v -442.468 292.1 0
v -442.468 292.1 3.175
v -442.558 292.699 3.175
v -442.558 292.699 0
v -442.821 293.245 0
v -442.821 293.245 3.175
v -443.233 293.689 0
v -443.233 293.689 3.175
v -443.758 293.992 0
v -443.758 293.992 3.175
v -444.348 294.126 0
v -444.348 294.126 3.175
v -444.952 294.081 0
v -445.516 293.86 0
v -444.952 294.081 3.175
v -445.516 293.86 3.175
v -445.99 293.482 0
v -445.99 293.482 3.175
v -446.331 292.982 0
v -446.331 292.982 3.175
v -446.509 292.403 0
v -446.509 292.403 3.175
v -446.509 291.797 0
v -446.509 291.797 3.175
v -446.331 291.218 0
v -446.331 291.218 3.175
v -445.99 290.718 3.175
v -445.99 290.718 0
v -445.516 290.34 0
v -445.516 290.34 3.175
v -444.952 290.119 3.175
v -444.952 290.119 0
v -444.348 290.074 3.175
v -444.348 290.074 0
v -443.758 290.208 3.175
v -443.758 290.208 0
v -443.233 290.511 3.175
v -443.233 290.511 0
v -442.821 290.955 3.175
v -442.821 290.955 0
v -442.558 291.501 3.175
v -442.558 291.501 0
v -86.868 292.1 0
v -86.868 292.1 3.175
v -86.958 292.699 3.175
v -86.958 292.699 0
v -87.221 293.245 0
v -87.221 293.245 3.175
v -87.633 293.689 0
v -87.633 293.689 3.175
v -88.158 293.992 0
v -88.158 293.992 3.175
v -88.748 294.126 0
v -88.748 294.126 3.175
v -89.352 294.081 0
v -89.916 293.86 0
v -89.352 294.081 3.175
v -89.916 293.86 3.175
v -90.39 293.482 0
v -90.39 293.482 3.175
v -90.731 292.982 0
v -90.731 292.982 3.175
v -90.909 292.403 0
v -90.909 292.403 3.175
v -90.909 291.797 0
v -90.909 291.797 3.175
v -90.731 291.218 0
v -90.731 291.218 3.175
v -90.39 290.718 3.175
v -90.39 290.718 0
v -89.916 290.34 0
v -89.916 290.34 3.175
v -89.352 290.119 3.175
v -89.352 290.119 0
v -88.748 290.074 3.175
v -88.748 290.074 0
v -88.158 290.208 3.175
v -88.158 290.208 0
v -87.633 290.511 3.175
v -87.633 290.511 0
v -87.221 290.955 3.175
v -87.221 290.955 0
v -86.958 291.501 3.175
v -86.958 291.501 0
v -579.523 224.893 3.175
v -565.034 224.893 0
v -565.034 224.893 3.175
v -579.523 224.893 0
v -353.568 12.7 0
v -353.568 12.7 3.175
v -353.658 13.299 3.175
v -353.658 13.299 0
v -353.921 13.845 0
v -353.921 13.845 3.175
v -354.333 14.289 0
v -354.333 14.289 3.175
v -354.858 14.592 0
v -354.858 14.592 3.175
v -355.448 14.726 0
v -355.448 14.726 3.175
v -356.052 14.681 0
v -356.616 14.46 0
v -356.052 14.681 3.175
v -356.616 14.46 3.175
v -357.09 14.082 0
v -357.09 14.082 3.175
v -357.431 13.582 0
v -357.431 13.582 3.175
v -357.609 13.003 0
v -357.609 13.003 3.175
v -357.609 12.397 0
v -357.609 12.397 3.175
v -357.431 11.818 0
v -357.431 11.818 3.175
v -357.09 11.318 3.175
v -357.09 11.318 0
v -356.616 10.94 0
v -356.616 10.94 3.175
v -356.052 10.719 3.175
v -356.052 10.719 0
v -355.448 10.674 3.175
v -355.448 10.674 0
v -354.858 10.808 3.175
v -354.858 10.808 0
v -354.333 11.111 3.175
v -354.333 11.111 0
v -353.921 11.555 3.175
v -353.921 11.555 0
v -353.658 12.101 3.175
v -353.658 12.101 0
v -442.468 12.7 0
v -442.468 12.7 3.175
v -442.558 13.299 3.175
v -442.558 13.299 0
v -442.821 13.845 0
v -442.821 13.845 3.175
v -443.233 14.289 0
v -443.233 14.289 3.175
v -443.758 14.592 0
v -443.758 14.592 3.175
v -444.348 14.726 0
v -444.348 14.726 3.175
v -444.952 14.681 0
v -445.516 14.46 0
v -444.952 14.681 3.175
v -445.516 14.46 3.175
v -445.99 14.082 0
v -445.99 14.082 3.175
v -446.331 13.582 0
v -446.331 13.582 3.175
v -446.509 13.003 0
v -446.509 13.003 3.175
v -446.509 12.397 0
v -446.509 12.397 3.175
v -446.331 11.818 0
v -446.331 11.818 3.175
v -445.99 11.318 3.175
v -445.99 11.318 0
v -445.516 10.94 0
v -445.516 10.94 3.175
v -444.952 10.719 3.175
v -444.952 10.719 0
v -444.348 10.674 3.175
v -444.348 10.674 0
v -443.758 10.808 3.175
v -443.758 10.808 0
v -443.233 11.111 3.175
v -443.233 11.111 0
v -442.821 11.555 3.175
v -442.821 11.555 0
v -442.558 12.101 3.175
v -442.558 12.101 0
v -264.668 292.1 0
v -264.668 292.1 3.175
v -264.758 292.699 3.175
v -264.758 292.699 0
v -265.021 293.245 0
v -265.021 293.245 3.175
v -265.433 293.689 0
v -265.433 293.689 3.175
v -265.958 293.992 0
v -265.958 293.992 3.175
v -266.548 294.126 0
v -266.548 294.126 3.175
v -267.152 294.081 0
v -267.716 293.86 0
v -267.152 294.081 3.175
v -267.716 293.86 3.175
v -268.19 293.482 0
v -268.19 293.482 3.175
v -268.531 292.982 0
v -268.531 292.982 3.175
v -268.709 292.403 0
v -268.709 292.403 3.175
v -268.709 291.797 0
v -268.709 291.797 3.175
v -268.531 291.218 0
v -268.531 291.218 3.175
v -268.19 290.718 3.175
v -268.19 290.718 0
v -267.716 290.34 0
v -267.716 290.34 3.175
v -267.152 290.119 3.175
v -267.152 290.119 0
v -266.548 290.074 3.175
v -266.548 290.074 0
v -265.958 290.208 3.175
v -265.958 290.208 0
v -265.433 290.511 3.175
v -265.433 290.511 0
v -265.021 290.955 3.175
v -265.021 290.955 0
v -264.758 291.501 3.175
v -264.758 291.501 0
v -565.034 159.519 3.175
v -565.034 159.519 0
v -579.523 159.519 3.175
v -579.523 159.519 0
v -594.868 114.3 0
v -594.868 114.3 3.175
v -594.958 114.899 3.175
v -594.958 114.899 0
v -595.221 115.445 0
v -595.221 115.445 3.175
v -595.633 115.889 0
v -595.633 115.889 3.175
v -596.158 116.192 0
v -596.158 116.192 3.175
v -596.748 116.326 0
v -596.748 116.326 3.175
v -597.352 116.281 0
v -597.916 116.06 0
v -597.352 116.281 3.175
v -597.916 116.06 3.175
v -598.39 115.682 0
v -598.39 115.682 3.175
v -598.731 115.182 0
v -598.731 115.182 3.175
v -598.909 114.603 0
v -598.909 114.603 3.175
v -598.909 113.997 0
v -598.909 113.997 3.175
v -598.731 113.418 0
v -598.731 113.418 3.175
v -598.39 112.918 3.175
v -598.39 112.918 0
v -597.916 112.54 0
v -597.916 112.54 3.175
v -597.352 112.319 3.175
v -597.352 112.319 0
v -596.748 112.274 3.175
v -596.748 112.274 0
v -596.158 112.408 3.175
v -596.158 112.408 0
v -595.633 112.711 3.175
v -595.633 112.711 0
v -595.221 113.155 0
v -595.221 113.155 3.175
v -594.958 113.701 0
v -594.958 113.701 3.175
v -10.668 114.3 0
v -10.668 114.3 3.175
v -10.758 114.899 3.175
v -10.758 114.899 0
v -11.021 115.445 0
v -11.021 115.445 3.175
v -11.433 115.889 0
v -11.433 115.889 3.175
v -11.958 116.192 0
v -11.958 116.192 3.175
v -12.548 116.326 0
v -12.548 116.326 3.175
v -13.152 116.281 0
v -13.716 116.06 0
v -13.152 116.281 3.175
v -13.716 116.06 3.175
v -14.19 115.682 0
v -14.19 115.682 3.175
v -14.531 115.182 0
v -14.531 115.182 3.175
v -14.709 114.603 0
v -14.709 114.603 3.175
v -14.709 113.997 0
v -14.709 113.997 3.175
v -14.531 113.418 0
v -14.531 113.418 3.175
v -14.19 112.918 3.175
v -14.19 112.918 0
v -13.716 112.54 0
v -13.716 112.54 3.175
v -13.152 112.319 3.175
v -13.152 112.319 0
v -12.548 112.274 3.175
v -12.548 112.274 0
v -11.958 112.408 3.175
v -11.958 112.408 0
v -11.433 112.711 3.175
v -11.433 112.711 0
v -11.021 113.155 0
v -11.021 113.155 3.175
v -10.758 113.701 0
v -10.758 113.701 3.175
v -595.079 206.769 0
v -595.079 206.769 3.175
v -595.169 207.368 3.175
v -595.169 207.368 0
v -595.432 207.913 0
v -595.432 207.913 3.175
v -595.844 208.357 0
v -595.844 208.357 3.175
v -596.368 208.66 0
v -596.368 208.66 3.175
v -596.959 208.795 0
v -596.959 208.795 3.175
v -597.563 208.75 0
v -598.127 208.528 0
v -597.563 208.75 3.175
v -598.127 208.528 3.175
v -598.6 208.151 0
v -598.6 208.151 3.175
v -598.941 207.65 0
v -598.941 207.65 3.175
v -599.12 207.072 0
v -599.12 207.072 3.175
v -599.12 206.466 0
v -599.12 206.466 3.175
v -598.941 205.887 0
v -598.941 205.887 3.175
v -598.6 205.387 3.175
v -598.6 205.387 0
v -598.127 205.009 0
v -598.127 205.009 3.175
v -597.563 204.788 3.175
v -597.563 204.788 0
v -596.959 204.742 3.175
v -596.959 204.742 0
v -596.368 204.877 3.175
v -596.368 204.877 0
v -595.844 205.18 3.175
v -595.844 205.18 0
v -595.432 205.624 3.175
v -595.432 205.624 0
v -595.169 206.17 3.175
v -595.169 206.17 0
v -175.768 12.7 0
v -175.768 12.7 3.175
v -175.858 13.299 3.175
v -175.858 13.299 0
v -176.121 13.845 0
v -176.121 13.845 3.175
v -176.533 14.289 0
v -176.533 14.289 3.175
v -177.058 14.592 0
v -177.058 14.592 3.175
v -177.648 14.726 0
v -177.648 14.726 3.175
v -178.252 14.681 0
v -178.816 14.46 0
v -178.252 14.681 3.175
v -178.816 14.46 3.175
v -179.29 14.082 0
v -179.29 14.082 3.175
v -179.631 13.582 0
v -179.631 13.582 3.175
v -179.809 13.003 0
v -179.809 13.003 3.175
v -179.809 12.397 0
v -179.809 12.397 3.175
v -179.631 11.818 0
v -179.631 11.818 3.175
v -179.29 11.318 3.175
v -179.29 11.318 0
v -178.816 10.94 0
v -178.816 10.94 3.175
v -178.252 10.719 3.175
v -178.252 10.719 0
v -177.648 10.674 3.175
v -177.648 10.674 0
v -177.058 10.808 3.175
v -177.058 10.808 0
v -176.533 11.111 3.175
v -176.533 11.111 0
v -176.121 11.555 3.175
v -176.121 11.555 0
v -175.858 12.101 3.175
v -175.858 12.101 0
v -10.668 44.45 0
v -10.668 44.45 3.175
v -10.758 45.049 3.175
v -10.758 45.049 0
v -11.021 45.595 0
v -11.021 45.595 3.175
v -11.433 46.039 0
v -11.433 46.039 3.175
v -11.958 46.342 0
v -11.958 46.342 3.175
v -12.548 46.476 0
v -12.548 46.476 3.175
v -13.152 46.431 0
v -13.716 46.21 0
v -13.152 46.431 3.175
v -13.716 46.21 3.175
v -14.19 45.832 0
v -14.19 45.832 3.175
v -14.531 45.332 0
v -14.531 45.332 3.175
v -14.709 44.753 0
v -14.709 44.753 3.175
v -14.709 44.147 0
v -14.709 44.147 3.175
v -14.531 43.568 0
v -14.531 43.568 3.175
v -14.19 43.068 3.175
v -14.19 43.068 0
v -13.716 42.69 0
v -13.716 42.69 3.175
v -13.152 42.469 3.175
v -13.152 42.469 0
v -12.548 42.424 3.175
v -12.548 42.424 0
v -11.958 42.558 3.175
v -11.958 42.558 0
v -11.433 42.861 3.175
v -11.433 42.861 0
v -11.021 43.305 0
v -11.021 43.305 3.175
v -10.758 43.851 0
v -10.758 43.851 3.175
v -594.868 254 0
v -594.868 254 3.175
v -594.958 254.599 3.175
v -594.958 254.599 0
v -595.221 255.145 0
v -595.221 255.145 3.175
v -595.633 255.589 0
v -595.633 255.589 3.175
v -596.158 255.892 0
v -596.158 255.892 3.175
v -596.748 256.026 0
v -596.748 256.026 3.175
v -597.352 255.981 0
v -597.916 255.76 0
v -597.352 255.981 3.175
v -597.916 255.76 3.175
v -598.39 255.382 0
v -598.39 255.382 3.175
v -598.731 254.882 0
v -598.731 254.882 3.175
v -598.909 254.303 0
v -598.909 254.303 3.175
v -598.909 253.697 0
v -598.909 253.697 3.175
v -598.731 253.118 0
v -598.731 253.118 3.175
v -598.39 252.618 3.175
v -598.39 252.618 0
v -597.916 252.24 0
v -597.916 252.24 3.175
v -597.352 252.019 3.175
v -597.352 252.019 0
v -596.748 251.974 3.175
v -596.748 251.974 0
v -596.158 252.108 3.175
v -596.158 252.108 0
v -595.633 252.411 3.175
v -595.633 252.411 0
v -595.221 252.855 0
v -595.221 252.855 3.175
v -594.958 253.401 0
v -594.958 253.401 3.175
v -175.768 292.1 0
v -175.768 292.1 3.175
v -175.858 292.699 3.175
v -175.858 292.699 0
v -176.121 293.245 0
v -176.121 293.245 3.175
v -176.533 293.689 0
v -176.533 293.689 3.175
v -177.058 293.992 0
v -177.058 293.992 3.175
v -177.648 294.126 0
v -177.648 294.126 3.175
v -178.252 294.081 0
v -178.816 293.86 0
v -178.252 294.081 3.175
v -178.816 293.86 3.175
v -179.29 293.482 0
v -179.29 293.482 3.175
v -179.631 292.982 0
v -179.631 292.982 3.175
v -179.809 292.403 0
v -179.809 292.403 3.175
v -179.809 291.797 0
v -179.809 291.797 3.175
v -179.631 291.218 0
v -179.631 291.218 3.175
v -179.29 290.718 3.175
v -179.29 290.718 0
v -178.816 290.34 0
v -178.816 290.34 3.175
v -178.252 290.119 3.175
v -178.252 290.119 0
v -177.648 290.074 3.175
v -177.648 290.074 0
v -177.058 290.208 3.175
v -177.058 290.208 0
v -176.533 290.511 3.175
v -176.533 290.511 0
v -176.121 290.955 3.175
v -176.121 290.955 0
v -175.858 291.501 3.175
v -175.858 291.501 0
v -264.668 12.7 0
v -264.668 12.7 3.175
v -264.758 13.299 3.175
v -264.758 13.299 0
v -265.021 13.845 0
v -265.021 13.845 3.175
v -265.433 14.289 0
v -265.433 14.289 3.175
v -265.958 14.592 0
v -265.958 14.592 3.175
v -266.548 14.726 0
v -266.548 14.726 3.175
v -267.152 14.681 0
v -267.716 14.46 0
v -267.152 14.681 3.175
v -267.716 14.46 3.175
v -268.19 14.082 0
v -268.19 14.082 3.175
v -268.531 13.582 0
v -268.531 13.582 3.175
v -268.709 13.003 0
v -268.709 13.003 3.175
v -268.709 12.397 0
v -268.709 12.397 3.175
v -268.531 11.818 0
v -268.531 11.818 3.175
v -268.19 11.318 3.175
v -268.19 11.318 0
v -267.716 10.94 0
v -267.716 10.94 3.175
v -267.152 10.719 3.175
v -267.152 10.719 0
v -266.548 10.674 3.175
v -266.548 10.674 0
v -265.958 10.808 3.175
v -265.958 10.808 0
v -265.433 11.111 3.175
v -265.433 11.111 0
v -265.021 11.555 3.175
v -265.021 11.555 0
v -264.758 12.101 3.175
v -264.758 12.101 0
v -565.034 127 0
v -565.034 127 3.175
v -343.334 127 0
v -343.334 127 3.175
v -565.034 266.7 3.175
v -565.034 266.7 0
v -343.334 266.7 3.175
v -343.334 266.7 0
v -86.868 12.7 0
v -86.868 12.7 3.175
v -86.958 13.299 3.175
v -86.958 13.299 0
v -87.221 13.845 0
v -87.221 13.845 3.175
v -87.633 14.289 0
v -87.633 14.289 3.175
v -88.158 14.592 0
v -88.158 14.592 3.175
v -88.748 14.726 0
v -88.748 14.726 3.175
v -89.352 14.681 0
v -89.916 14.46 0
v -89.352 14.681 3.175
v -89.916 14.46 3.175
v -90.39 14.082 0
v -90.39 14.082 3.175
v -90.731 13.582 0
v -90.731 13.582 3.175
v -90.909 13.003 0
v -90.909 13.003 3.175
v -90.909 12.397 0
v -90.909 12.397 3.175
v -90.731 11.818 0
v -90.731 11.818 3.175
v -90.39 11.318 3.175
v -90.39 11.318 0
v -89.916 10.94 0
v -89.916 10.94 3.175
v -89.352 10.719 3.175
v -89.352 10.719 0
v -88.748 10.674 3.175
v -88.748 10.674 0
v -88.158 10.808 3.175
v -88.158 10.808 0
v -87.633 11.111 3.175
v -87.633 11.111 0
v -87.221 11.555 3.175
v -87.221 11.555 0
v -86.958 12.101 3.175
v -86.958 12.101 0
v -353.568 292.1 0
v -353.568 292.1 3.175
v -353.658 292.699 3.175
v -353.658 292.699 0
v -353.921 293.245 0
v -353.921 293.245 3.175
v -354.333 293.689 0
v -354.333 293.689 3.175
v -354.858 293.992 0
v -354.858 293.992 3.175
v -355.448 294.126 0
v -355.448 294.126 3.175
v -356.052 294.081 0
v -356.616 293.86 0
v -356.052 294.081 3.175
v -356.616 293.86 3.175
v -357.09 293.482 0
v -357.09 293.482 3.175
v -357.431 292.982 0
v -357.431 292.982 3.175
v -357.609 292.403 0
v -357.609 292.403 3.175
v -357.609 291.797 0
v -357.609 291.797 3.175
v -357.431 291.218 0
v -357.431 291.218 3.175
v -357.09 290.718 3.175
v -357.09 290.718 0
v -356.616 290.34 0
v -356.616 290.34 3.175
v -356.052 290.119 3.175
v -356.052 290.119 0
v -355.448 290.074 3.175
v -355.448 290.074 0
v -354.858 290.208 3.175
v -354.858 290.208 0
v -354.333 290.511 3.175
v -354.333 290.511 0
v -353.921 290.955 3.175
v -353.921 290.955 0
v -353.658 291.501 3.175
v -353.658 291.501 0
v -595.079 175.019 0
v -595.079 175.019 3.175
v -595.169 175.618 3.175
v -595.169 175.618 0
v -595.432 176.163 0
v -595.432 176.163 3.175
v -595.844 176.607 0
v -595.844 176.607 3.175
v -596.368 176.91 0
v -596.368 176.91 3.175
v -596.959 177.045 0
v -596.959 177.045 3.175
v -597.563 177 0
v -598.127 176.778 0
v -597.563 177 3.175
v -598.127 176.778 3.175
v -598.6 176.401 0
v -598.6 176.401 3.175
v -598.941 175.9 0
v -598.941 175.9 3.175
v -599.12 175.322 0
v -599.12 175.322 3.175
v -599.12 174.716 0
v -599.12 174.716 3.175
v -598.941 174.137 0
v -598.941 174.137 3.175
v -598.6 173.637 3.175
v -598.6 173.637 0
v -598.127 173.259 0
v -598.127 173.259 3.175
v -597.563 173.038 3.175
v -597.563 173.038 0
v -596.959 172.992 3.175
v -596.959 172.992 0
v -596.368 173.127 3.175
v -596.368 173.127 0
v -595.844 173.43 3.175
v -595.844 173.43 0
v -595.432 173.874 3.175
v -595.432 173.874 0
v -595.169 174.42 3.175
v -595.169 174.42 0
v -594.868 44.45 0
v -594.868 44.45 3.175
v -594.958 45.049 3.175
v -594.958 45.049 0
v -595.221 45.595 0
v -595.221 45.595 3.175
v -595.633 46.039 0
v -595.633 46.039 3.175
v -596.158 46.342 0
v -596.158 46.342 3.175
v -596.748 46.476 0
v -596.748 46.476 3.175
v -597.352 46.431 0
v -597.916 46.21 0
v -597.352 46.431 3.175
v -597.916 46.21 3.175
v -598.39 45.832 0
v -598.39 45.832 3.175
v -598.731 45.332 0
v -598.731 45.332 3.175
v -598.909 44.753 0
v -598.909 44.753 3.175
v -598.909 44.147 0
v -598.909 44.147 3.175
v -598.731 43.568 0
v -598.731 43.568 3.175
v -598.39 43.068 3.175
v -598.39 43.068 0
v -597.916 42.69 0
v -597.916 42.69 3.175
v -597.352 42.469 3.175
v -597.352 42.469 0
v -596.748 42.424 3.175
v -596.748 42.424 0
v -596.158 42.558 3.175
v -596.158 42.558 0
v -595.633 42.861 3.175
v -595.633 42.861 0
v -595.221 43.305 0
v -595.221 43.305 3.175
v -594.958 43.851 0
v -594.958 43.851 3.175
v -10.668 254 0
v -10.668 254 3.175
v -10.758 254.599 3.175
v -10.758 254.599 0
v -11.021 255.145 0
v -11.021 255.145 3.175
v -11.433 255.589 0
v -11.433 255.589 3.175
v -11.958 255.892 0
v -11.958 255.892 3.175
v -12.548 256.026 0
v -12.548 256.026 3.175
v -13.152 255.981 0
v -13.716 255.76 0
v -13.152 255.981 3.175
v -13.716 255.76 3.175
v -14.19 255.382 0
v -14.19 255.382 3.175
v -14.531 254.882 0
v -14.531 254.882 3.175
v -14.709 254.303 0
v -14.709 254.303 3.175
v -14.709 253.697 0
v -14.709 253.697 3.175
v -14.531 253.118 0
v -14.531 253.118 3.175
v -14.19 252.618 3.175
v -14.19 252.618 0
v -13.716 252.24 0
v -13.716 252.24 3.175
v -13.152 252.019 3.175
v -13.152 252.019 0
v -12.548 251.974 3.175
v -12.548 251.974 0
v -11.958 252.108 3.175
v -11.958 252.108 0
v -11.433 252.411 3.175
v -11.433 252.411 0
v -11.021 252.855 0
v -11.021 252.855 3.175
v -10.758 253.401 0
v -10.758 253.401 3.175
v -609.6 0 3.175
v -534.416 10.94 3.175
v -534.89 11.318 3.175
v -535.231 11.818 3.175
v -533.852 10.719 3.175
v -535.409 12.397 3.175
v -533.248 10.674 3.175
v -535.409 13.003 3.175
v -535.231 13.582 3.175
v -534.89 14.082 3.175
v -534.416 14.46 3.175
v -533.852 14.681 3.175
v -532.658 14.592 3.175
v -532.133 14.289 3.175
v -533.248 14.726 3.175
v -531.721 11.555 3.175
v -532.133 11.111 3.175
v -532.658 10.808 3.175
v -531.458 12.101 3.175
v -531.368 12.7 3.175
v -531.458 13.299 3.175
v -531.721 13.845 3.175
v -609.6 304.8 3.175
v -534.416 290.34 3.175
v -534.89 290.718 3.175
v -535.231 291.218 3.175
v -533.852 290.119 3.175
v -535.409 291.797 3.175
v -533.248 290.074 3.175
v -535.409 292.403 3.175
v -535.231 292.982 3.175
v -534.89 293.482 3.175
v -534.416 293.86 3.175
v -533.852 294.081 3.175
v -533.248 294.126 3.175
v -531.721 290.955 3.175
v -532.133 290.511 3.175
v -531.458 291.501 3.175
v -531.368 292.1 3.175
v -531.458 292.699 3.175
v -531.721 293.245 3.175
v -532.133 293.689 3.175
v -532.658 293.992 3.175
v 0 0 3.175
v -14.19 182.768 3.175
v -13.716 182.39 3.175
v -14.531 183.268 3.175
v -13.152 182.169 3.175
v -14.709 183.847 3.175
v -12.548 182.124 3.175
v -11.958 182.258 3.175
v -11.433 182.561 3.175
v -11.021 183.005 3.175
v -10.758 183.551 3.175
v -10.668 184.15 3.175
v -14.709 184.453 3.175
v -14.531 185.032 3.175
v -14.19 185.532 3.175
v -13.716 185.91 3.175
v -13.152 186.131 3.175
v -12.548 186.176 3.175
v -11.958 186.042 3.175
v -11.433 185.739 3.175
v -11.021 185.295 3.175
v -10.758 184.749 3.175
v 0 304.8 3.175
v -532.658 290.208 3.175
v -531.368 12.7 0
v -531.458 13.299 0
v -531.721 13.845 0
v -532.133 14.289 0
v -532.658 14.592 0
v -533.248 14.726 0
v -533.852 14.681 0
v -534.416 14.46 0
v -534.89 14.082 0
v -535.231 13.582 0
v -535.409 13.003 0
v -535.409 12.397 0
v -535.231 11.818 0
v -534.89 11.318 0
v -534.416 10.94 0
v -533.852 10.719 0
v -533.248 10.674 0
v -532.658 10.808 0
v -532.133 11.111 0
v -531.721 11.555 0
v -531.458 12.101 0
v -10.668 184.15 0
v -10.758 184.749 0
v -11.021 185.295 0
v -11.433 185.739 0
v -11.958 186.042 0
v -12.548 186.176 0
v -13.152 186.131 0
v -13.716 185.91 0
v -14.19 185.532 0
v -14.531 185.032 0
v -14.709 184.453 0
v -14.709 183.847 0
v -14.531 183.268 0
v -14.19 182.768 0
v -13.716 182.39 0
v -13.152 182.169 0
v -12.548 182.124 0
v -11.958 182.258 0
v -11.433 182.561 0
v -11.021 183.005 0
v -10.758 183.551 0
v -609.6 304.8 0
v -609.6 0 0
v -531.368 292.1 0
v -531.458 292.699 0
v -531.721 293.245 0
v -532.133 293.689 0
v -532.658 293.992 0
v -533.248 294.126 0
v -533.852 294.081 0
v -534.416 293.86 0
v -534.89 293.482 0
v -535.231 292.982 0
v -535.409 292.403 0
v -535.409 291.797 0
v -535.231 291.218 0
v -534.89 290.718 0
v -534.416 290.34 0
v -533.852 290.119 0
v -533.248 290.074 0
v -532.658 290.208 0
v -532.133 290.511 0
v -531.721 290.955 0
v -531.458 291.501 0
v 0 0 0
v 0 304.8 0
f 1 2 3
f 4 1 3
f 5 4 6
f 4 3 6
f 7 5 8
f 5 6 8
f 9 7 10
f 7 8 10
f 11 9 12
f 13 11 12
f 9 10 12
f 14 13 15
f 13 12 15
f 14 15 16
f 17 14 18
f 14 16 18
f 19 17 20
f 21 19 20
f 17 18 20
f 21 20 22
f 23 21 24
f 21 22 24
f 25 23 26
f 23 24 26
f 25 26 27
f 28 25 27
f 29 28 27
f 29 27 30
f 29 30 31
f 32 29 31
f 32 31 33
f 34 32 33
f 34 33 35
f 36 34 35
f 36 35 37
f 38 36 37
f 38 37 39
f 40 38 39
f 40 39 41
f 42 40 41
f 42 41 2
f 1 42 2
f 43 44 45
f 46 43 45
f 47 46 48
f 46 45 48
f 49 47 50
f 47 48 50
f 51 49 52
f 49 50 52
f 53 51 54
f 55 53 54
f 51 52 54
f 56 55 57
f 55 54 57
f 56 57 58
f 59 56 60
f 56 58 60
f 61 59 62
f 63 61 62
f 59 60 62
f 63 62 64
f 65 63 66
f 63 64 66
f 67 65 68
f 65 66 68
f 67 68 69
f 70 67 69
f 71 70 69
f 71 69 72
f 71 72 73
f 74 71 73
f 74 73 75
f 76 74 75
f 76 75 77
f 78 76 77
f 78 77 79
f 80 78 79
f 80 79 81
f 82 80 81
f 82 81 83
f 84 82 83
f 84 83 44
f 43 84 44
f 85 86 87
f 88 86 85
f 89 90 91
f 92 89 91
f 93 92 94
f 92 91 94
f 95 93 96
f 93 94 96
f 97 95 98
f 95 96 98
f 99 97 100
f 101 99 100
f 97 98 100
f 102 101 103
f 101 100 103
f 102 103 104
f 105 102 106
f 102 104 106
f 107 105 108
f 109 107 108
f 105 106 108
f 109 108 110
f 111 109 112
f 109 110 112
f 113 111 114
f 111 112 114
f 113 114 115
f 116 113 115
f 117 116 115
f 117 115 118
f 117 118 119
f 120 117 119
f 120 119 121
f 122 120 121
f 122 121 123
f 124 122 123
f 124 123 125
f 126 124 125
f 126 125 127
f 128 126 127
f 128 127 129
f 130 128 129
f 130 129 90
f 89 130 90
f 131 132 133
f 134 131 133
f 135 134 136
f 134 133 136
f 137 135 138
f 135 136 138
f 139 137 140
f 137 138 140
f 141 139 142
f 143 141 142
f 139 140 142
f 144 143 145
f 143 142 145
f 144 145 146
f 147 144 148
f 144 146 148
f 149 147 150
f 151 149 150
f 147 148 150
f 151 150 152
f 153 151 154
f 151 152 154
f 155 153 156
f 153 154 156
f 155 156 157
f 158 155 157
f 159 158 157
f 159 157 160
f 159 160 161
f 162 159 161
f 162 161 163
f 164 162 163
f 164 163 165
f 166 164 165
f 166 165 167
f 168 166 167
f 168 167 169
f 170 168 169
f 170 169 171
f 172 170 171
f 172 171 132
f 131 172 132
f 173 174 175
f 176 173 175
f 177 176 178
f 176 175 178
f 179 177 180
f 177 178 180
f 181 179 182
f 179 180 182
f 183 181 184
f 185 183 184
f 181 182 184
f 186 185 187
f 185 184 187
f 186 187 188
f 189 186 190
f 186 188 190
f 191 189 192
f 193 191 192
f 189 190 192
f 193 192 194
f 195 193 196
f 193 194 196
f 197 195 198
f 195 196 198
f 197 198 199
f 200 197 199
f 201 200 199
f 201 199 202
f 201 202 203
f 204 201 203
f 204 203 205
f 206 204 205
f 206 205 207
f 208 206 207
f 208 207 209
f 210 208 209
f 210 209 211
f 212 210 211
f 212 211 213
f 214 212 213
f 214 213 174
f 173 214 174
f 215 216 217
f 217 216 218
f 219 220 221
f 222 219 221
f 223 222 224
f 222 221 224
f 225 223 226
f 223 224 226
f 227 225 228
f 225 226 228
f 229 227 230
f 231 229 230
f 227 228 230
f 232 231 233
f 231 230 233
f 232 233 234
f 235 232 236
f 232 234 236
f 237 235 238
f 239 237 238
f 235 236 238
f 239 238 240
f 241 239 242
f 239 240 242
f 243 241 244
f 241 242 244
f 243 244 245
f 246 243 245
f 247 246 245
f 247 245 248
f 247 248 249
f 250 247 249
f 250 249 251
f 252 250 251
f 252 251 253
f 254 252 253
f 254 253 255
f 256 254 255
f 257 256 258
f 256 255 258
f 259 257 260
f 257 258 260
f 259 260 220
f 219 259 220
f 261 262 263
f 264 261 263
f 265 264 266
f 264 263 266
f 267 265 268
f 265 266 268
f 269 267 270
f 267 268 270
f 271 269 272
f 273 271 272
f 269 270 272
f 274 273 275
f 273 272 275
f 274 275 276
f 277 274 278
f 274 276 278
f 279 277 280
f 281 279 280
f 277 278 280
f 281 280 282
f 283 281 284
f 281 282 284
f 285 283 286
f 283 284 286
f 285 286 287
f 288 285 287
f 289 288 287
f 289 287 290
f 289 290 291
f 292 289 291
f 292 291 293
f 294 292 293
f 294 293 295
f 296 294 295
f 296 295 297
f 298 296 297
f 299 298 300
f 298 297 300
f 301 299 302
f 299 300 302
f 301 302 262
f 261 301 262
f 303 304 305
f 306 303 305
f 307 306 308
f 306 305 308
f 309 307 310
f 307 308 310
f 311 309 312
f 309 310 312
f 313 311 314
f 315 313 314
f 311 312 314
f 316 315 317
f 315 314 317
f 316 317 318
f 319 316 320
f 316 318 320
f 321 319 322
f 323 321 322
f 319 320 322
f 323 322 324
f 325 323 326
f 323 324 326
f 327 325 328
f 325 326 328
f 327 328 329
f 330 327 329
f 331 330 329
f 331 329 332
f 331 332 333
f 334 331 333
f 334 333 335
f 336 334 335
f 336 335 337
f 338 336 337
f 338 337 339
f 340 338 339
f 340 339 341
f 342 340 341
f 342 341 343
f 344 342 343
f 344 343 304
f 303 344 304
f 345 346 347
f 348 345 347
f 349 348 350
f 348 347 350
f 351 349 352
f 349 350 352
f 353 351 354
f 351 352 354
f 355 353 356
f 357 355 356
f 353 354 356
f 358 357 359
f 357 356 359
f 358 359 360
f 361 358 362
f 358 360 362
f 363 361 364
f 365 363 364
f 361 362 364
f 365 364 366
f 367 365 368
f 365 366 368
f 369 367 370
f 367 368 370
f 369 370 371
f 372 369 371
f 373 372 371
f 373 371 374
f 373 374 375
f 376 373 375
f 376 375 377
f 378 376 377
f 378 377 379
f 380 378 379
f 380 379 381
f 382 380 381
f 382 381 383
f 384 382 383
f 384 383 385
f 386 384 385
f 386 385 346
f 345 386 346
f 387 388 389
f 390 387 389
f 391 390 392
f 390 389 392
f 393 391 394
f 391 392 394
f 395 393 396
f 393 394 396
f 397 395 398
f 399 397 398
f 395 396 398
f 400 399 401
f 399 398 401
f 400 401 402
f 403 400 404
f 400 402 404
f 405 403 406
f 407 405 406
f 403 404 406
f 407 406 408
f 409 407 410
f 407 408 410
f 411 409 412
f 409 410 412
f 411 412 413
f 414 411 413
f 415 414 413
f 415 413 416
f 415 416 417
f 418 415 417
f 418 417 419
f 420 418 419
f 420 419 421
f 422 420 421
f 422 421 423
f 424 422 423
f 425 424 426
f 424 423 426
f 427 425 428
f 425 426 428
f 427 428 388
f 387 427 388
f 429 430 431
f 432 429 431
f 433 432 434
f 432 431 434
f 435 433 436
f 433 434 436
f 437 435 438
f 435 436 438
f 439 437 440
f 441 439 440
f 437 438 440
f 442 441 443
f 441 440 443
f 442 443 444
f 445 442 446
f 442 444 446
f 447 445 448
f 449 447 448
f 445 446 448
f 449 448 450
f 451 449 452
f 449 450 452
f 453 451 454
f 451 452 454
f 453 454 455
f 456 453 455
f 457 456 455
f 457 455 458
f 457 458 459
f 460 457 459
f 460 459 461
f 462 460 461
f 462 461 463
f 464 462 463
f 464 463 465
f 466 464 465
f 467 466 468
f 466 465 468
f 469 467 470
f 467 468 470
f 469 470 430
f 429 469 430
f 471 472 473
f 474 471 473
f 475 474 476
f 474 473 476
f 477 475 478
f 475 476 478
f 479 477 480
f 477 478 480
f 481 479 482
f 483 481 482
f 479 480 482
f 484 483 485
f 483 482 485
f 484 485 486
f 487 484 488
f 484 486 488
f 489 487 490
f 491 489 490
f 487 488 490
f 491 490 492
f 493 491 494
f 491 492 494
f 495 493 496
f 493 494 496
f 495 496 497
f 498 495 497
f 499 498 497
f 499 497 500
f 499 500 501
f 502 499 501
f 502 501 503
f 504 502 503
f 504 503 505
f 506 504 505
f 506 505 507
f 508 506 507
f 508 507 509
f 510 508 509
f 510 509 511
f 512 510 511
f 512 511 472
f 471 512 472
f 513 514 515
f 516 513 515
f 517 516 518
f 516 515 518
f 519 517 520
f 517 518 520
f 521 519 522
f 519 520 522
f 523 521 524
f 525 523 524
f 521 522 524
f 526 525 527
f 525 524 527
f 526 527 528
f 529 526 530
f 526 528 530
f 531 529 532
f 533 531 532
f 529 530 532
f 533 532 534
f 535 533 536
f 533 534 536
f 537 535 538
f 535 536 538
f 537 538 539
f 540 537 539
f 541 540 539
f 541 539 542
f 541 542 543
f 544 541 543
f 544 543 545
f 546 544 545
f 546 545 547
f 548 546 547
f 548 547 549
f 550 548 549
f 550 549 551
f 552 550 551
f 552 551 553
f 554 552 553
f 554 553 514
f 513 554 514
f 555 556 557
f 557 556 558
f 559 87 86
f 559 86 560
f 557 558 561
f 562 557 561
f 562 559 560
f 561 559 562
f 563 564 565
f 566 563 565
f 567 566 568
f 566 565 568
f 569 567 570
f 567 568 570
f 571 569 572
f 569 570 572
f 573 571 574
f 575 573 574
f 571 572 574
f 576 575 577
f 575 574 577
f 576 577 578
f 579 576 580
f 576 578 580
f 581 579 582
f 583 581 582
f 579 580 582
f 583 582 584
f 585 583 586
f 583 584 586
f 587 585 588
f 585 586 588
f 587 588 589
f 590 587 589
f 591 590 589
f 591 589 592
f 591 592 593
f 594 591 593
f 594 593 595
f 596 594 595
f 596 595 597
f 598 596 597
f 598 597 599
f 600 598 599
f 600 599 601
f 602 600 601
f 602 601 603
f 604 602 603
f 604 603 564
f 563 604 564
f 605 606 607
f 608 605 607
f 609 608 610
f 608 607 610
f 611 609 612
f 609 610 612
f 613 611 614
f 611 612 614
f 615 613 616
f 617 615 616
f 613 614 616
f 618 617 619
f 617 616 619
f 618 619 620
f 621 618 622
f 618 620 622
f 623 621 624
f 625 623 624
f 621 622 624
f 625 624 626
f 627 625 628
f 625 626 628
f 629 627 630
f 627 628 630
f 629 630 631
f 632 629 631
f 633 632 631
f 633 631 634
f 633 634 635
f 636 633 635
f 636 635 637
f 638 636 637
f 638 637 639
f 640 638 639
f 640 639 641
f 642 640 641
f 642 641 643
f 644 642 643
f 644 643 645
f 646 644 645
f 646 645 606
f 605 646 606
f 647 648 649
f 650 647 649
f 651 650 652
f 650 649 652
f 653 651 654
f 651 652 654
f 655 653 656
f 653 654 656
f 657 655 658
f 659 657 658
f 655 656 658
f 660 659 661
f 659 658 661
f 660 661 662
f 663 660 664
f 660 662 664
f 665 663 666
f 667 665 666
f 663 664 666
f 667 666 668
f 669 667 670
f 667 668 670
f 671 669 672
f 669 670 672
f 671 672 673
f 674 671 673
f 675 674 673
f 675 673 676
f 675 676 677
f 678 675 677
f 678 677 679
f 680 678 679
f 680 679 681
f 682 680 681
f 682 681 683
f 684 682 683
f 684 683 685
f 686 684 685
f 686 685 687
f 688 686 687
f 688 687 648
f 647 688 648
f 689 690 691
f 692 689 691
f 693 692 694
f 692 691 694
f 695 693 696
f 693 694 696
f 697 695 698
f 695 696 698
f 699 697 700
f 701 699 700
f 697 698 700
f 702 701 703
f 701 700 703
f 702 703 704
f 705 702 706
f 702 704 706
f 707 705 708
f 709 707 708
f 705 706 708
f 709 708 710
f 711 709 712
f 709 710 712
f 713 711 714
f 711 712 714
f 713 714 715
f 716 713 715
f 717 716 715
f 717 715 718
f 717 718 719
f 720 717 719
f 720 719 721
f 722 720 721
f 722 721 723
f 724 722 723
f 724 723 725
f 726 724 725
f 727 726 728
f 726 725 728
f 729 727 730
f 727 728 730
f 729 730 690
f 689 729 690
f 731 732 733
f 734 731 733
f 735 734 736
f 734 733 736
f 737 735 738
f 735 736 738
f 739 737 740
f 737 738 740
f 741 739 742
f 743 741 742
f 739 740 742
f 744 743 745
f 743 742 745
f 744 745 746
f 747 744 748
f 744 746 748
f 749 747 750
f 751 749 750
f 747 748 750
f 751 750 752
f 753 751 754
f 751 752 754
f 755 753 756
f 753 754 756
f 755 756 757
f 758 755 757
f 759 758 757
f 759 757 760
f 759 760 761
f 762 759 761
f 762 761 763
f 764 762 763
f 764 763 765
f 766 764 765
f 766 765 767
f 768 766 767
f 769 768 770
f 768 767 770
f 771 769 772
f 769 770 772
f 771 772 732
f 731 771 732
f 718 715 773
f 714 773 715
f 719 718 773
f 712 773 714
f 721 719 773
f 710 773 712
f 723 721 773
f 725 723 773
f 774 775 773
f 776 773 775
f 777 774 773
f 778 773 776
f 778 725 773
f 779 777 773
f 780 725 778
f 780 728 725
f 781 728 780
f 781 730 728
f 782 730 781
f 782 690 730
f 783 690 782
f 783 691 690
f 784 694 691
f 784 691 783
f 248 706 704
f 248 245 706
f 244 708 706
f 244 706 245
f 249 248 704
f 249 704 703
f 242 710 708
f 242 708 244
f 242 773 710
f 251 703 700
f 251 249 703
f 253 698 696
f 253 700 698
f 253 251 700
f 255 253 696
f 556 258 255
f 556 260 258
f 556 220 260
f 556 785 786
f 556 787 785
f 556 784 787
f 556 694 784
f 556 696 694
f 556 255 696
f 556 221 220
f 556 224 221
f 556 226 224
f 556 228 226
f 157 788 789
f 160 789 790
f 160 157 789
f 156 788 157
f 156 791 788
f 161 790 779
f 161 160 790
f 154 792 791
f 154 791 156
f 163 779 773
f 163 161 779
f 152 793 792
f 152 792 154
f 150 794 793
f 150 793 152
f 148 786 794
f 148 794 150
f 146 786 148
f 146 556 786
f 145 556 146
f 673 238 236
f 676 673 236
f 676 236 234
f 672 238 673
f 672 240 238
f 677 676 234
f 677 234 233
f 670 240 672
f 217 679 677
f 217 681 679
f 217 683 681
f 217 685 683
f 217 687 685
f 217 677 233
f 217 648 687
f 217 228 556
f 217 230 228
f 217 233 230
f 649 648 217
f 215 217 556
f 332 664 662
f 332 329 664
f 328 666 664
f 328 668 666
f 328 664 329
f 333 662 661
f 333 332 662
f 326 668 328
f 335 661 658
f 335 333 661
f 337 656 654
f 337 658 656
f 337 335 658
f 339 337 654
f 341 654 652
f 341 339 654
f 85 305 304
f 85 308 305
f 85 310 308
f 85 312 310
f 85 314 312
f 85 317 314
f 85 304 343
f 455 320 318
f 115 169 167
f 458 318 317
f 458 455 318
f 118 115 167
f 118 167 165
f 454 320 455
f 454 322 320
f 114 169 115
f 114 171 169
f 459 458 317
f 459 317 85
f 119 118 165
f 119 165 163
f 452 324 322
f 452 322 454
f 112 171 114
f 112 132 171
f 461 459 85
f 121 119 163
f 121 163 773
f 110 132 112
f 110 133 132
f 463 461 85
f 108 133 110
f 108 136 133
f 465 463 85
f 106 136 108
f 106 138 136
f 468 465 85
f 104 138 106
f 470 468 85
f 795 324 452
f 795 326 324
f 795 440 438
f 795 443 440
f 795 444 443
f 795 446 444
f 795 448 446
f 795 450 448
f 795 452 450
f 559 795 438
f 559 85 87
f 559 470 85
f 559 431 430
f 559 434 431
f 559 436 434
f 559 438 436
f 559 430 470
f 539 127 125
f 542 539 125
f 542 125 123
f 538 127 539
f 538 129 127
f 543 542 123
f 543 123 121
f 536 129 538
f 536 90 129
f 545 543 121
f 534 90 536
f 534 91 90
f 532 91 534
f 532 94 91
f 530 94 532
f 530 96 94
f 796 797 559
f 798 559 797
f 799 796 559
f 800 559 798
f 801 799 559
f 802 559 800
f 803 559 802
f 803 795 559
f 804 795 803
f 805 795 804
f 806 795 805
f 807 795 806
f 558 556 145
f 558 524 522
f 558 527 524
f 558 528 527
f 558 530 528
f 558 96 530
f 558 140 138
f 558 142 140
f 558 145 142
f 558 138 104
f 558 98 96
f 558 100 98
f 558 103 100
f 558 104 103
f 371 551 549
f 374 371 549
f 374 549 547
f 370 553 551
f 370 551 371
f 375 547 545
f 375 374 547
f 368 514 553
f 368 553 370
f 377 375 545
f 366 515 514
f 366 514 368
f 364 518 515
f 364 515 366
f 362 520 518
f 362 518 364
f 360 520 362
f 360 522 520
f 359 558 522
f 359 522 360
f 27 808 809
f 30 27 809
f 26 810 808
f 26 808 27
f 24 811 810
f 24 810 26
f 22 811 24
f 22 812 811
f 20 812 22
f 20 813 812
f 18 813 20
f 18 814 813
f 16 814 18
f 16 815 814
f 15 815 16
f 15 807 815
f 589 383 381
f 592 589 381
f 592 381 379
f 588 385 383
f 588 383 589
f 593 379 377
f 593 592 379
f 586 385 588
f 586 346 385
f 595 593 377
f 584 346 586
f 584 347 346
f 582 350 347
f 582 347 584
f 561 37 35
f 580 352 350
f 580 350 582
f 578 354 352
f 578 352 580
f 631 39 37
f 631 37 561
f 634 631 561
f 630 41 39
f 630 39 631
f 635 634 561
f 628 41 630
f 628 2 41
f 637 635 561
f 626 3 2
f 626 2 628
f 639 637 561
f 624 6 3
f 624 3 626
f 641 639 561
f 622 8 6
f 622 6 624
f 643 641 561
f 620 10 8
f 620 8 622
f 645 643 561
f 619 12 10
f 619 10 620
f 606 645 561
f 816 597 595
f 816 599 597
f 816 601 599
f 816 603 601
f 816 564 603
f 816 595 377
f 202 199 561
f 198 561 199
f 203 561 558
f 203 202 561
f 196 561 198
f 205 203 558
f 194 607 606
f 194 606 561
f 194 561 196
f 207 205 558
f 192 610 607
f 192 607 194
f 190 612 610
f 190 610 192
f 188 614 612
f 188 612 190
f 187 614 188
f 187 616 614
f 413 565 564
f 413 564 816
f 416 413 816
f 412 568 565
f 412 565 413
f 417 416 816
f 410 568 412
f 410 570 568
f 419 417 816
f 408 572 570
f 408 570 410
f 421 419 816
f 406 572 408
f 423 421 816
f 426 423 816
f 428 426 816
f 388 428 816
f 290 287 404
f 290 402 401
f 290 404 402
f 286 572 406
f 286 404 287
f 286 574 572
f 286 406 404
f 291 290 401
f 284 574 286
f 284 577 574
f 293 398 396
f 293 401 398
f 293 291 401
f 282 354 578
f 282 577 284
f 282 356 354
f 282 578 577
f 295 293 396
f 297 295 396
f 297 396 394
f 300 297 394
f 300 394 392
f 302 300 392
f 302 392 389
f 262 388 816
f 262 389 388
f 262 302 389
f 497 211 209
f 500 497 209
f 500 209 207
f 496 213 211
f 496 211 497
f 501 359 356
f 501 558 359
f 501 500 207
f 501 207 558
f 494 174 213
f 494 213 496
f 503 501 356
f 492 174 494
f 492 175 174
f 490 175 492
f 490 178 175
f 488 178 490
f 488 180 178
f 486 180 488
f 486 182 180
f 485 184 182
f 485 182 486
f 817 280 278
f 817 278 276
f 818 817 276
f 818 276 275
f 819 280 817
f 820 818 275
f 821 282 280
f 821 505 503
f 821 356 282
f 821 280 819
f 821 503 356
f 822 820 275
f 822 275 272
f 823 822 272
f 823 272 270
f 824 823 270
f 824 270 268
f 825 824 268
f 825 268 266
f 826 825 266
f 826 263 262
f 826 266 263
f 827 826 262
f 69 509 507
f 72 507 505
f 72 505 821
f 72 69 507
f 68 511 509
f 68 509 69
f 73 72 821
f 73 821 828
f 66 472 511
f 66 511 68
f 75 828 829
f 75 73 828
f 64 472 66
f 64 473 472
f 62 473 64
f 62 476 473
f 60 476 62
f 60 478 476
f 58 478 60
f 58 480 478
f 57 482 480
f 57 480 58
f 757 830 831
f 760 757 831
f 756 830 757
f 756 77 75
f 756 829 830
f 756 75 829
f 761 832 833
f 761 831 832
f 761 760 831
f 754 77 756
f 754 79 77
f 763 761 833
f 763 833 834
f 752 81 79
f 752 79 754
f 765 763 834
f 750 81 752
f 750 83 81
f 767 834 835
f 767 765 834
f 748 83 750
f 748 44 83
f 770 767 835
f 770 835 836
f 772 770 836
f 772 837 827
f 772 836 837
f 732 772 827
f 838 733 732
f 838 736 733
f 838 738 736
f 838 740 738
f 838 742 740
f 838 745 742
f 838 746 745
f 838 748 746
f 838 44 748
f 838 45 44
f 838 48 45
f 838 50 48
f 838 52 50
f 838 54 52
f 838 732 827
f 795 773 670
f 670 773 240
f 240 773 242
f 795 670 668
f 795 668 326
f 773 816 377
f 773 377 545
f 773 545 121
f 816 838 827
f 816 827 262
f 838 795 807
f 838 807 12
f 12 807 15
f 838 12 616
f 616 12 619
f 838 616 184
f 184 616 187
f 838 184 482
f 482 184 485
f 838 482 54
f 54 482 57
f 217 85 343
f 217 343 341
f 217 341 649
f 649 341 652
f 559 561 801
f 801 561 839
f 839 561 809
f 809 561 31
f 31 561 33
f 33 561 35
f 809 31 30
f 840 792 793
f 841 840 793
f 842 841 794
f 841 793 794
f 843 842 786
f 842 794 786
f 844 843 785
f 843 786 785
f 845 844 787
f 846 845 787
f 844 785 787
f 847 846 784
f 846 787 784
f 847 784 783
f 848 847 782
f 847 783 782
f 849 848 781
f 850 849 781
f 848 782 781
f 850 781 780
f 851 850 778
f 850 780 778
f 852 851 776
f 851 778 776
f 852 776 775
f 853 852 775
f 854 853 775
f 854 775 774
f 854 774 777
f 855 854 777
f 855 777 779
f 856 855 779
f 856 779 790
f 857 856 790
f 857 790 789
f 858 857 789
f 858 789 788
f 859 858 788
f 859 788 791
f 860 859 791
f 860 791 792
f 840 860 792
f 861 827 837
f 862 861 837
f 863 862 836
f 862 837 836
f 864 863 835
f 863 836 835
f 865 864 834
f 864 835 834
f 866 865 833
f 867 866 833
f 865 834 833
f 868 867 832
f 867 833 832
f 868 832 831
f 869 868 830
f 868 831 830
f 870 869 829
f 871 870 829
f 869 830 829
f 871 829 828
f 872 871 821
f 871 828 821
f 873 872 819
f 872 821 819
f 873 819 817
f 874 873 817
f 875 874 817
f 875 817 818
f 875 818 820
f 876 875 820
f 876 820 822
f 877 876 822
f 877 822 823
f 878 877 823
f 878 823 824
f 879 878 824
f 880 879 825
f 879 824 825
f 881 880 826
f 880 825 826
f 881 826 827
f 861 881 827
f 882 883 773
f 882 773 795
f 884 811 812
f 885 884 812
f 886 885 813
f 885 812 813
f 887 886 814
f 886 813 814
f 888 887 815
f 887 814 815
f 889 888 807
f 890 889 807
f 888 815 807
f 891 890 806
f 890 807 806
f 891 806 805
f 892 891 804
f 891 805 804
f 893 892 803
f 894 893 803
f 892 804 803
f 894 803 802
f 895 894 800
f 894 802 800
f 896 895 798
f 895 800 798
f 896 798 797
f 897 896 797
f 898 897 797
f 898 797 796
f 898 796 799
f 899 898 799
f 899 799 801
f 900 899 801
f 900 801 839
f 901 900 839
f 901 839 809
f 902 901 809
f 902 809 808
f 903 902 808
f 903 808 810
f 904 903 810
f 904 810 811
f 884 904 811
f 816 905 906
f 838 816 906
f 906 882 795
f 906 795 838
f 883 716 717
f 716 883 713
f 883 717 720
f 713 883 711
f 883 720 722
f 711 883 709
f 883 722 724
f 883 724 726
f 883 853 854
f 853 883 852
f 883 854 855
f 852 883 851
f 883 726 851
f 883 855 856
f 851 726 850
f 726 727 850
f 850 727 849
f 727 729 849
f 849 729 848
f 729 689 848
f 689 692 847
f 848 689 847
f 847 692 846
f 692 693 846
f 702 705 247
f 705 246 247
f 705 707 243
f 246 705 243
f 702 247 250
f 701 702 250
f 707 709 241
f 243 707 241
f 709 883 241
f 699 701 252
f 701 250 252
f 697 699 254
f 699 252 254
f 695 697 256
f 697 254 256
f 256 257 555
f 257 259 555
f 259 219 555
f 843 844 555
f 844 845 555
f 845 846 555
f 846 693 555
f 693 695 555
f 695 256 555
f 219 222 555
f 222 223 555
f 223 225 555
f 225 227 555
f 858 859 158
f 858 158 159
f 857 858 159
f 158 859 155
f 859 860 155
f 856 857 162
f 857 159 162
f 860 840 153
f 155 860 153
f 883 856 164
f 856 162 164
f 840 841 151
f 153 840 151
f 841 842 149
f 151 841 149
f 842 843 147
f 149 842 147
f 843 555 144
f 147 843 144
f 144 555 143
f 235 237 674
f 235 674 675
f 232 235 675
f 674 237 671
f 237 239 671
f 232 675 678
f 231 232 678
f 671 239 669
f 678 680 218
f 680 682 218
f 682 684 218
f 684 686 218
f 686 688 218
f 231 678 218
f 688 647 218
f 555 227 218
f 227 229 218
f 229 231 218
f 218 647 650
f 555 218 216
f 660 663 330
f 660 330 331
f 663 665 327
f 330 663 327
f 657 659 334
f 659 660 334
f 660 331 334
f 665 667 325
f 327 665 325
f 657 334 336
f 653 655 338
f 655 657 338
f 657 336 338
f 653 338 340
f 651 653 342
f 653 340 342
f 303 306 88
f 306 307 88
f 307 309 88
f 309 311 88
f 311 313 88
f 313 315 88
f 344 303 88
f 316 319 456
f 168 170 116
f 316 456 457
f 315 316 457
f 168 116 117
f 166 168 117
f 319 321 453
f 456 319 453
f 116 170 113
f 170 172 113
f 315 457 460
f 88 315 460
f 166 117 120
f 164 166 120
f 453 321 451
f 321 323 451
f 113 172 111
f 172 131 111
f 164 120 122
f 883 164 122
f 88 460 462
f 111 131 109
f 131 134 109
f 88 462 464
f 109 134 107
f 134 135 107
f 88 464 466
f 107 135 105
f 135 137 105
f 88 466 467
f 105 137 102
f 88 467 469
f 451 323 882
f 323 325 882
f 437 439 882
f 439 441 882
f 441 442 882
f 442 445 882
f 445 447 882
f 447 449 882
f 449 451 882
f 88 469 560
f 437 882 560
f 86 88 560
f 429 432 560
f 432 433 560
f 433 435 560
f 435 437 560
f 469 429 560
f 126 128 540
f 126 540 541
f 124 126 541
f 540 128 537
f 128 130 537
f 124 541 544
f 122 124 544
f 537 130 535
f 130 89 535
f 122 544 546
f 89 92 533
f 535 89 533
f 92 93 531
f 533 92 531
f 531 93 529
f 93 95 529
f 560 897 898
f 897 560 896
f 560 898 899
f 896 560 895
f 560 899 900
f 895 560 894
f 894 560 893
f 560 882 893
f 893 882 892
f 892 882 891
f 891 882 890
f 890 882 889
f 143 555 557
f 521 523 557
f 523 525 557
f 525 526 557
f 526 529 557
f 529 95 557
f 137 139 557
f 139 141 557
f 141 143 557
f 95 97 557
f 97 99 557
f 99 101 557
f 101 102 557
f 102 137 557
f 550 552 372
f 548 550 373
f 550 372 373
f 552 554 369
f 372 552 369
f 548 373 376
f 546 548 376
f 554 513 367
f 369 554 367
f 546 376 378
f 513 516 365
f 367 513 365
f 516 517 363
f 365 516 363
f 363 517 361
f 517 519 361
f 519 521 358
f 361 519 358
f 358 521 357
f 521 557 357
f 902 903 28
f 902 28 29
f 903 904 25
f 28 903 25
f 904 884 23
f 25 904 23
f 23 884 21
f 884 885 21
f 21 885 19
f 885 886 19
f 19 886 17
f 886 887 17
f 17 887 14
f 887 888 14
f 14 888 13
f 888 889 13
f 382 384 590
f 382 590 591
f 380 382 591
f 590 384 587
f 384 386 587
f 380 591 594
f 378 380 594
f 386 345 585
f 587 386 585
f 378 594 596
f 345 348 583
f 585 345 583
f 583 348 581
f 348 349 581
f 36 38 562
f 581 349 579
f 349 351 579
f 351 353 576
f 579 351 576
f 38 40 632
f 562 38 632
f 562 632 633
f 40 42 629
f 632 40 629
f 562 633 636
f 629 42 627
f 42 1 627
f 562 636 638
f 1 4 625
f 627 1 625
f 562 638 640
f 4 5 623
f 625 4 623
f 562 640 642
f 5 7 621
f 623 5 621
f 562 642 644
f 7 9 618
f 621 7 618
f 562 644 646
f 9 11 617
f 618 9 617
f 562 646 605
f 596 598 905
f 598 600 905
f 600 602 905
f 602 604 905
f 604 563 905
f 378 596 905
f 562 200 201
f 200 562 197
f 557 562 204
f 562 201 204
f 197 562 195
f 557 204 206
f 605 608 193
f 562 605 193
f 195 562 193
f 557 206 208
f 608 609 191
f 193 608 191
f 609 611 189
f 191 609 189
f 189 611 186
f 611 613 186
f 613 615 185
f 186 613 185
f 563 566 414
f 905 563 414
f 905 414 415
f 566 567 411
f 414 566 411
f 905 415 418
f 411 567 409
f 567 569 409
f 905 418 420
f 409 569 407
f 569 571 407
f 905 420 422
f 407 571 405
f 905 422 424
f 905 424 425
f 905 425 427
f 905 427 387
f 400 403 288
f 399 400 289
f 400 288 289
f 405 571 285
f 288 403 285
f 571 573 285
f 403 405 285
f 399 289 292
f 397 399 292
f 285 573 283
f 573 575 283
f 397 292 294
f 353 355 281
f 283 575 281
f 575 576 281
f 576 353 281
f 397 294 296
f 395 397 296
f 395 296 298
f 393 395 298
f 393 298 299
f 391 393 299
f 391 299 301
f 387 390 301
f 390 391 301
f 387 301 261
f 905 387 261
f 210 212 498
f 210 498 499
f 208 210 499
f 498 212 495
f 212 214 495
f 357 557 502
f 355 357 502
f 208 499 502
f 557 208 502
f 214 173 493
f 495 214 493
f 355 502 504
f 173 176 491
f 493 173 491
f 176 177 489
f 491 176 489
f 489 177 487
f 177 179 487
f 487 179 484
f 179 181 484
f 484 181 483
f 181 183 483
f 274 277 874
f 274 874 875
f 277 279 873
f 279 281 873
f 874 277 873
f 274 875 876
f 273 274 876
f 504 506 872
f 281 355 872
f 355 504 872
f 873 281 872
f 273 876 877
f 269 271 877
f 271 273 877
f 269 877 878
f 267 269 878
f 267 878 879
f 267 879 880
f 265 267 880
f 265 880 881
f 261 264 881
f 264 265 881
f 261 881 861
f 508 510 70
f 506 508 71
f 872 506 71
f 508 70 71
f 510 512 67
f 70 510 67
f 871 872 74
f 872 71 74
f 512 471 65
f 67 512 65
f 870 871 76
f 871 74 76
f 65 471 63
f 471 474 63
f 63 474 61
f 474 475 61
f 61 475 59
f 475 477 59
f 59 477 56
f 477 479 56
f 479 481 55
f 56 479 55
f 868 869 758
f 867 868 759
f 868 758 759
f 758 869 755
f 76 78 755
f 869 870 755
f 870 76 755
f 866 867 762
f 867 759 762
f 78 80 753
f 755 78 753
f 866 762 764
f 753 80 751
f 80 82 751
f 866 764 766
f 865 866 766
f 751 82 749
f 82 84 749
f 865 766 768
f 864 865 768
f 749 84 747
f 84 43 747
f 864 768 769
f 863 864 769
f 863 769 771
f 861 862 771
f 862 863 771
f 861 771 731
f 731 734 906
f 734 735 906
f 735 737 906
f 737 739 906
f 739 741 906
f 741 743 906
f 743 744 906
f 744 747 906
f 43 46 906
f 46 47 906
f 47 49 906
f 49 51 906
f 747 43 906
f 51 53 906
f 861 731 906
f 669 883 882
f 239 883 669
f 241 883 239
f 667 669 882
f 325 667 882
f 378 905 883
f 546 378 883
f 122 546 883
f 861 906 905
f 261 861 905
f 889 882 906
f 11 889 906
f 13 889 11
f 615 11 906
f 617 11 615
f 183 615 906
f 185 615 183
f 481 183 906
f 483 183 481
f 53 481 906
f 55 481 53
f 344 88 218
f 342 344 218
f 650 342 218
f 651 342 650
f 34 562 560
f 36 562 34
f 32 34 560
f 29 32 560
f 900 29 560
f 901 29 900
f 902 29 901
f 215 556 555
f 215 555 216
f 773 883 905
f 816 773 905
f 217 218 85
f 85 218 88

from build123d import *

# Parameters (mm, degrees)
SKETCH1_W               = 609.6
SKETCH1_H               = 304.8
BOSS_EXTRUDE1_DEPTH     = 3.175
SKETCH5_R               = 2.032
CUT_EXTRUDE4_DEPTH      = 4.175
SKETCH6_R               = 2.032
CUT_EXTRUDE5_DEPTH      = 10
CUT_EXTRUDE5_DEPTH_BACK = 3.175
SKETCH20_R              = 2.032
CUT_EXTRUDE17_DEPTH     = 4.175
SKETCH8_W               = 221.700000084
SKETCH8_H               = 139.7
CUT_EXTRUDE6_DEPTH      = 3.175
SKETCH19_W              = 14.489703264
SKETCH19_H              = 65.374013416
CUT_EXTRUDE16_DEPTH     = 4.175


with BuildPart() as part:
    # Sketch1 → Boss-Extrude1 (new body)
    with BuildSketch(Plane.XY):
        with Locations((-304.8, 152.4)):
            Rectangle(SKETCH1_W, SKETCH1_H)
    extrude(amount=BOSS_EXTRUDE1_DEPTH)

    # Sketch5 → Cut-Extrude4 (cut, through all)
    with BuildSketch(Plane.XY.offset(3.175)):
        with Locations((-533.4, 12.7)):
            Circle(SKETCH5_R)
        with Locations((-444.5, 12.7)):
            Circle(SKETCH5_R)
        with Locations((-355.6, 12.7)):
            Circle(SKETCH5_R)
        with Locations((-266.7, 12.7)):
            Circle(SKETCH5_R)
        with Locations((-177.8, 12.7)):
            Circle(SKETCH5_R)
        with Locations((-88.9, 12.7)):
            Circle(SKETCH5_R)
        with Locations((-88.9, 292.1)):
            Circle(SKETCH5_R)
        with Locations((-177.8, 292.1)):
            Circle(SKETCH5_R)
        with Locations((-266.7, 292.1)):
            Circle(SKETCH5_R)
        with Locations((-355.6, 292.1)):
            Circle(SKETCH5_R)
        with Locations((-444.5, 292.1)):
            Circle(SKETCH5_R)
        with Locations((-533.4, 292.1)):
            Circle(SKETCH5_R)
    extrude(amount=-CUT_EXTRUDE4_DEPTH, mode=Mode.SUBTRACT)

    # Sketch6 → Cut-Extrude5 (cut, two sides)
    with BuildSketch(Plane.XY.offset(3.175)) as cut_extrude5_sk:
        with Locations((-596.9, 254)):
            Circle(SKETCH6_R)
        with Locations((-596.9, 114.3)):
            Circle(SKETCH6_R)
        with Locations((-596.9, 44.45)):
            Circle(SKETCH6_R)
        with Locations((-12.7, 254)):
            Circle(SKETCH6_R)
        with Locations((-12.7, 184.15)):
            Circle(SKETCH6_R)
        with Locations((-12.7, 114.3)):
            Circle(SKETCH6_R)
        with Locations((-12.7, 44.45)):
            Circle(SKETCH6_R)
    extrude(amount=CUT_EXTRUDE5_DEPTH, mode=Mode.SUBTRACT)
    extrude(cut_extrude5_sk.sketch, amount=-CUT_EXTRUDE5_DEPTH_BACK, mode=Mode.SUBTRACT)

    # Sketch20 → Cut-Extrude17 (cut, through all)
    with BuildSketch(Plane.XY.offset(3.175)):
        with Locations((-597.110646497, 175.018670592)):
            Circle(SKETCH20_R)
        with Locations((-597.110646497, 206.768670592)):
            Circle(SKETCH20_R)
    extrude(amount=-CUT_EXTRUDE17_DEPTH, mode=Mode.SUBTRACT)

    # Sketch8 → Cut-Extrude6 (cut)
    with BuildSketch(Plane.XY.offset(3.175)):
        with Locations((-454.183579328, 196.85)):
            Rectangle(SKETCH8_W, SKETCH8_H)
    extrude(amount=-CUT_EXTRUDE6_DEPTH, mode=Mode.SUBTRACT)

    # Sketch19 → Cut-Extrude16 (cut, through all)
    with BuildSketch(Plane(origin=(0, 0, 0), x_dir=(-1, 0, 0), z_dir=(0, 0, -1))):
        with Locations((572.278431002, 192.206332301)):
            Rectangle(SKETCH19_W, SKETCH19_H)
    extrude(amount=-CUT_EXTRUDE16_DEPTH, mode=Mode.SUBTRACT)


solid = part.part
